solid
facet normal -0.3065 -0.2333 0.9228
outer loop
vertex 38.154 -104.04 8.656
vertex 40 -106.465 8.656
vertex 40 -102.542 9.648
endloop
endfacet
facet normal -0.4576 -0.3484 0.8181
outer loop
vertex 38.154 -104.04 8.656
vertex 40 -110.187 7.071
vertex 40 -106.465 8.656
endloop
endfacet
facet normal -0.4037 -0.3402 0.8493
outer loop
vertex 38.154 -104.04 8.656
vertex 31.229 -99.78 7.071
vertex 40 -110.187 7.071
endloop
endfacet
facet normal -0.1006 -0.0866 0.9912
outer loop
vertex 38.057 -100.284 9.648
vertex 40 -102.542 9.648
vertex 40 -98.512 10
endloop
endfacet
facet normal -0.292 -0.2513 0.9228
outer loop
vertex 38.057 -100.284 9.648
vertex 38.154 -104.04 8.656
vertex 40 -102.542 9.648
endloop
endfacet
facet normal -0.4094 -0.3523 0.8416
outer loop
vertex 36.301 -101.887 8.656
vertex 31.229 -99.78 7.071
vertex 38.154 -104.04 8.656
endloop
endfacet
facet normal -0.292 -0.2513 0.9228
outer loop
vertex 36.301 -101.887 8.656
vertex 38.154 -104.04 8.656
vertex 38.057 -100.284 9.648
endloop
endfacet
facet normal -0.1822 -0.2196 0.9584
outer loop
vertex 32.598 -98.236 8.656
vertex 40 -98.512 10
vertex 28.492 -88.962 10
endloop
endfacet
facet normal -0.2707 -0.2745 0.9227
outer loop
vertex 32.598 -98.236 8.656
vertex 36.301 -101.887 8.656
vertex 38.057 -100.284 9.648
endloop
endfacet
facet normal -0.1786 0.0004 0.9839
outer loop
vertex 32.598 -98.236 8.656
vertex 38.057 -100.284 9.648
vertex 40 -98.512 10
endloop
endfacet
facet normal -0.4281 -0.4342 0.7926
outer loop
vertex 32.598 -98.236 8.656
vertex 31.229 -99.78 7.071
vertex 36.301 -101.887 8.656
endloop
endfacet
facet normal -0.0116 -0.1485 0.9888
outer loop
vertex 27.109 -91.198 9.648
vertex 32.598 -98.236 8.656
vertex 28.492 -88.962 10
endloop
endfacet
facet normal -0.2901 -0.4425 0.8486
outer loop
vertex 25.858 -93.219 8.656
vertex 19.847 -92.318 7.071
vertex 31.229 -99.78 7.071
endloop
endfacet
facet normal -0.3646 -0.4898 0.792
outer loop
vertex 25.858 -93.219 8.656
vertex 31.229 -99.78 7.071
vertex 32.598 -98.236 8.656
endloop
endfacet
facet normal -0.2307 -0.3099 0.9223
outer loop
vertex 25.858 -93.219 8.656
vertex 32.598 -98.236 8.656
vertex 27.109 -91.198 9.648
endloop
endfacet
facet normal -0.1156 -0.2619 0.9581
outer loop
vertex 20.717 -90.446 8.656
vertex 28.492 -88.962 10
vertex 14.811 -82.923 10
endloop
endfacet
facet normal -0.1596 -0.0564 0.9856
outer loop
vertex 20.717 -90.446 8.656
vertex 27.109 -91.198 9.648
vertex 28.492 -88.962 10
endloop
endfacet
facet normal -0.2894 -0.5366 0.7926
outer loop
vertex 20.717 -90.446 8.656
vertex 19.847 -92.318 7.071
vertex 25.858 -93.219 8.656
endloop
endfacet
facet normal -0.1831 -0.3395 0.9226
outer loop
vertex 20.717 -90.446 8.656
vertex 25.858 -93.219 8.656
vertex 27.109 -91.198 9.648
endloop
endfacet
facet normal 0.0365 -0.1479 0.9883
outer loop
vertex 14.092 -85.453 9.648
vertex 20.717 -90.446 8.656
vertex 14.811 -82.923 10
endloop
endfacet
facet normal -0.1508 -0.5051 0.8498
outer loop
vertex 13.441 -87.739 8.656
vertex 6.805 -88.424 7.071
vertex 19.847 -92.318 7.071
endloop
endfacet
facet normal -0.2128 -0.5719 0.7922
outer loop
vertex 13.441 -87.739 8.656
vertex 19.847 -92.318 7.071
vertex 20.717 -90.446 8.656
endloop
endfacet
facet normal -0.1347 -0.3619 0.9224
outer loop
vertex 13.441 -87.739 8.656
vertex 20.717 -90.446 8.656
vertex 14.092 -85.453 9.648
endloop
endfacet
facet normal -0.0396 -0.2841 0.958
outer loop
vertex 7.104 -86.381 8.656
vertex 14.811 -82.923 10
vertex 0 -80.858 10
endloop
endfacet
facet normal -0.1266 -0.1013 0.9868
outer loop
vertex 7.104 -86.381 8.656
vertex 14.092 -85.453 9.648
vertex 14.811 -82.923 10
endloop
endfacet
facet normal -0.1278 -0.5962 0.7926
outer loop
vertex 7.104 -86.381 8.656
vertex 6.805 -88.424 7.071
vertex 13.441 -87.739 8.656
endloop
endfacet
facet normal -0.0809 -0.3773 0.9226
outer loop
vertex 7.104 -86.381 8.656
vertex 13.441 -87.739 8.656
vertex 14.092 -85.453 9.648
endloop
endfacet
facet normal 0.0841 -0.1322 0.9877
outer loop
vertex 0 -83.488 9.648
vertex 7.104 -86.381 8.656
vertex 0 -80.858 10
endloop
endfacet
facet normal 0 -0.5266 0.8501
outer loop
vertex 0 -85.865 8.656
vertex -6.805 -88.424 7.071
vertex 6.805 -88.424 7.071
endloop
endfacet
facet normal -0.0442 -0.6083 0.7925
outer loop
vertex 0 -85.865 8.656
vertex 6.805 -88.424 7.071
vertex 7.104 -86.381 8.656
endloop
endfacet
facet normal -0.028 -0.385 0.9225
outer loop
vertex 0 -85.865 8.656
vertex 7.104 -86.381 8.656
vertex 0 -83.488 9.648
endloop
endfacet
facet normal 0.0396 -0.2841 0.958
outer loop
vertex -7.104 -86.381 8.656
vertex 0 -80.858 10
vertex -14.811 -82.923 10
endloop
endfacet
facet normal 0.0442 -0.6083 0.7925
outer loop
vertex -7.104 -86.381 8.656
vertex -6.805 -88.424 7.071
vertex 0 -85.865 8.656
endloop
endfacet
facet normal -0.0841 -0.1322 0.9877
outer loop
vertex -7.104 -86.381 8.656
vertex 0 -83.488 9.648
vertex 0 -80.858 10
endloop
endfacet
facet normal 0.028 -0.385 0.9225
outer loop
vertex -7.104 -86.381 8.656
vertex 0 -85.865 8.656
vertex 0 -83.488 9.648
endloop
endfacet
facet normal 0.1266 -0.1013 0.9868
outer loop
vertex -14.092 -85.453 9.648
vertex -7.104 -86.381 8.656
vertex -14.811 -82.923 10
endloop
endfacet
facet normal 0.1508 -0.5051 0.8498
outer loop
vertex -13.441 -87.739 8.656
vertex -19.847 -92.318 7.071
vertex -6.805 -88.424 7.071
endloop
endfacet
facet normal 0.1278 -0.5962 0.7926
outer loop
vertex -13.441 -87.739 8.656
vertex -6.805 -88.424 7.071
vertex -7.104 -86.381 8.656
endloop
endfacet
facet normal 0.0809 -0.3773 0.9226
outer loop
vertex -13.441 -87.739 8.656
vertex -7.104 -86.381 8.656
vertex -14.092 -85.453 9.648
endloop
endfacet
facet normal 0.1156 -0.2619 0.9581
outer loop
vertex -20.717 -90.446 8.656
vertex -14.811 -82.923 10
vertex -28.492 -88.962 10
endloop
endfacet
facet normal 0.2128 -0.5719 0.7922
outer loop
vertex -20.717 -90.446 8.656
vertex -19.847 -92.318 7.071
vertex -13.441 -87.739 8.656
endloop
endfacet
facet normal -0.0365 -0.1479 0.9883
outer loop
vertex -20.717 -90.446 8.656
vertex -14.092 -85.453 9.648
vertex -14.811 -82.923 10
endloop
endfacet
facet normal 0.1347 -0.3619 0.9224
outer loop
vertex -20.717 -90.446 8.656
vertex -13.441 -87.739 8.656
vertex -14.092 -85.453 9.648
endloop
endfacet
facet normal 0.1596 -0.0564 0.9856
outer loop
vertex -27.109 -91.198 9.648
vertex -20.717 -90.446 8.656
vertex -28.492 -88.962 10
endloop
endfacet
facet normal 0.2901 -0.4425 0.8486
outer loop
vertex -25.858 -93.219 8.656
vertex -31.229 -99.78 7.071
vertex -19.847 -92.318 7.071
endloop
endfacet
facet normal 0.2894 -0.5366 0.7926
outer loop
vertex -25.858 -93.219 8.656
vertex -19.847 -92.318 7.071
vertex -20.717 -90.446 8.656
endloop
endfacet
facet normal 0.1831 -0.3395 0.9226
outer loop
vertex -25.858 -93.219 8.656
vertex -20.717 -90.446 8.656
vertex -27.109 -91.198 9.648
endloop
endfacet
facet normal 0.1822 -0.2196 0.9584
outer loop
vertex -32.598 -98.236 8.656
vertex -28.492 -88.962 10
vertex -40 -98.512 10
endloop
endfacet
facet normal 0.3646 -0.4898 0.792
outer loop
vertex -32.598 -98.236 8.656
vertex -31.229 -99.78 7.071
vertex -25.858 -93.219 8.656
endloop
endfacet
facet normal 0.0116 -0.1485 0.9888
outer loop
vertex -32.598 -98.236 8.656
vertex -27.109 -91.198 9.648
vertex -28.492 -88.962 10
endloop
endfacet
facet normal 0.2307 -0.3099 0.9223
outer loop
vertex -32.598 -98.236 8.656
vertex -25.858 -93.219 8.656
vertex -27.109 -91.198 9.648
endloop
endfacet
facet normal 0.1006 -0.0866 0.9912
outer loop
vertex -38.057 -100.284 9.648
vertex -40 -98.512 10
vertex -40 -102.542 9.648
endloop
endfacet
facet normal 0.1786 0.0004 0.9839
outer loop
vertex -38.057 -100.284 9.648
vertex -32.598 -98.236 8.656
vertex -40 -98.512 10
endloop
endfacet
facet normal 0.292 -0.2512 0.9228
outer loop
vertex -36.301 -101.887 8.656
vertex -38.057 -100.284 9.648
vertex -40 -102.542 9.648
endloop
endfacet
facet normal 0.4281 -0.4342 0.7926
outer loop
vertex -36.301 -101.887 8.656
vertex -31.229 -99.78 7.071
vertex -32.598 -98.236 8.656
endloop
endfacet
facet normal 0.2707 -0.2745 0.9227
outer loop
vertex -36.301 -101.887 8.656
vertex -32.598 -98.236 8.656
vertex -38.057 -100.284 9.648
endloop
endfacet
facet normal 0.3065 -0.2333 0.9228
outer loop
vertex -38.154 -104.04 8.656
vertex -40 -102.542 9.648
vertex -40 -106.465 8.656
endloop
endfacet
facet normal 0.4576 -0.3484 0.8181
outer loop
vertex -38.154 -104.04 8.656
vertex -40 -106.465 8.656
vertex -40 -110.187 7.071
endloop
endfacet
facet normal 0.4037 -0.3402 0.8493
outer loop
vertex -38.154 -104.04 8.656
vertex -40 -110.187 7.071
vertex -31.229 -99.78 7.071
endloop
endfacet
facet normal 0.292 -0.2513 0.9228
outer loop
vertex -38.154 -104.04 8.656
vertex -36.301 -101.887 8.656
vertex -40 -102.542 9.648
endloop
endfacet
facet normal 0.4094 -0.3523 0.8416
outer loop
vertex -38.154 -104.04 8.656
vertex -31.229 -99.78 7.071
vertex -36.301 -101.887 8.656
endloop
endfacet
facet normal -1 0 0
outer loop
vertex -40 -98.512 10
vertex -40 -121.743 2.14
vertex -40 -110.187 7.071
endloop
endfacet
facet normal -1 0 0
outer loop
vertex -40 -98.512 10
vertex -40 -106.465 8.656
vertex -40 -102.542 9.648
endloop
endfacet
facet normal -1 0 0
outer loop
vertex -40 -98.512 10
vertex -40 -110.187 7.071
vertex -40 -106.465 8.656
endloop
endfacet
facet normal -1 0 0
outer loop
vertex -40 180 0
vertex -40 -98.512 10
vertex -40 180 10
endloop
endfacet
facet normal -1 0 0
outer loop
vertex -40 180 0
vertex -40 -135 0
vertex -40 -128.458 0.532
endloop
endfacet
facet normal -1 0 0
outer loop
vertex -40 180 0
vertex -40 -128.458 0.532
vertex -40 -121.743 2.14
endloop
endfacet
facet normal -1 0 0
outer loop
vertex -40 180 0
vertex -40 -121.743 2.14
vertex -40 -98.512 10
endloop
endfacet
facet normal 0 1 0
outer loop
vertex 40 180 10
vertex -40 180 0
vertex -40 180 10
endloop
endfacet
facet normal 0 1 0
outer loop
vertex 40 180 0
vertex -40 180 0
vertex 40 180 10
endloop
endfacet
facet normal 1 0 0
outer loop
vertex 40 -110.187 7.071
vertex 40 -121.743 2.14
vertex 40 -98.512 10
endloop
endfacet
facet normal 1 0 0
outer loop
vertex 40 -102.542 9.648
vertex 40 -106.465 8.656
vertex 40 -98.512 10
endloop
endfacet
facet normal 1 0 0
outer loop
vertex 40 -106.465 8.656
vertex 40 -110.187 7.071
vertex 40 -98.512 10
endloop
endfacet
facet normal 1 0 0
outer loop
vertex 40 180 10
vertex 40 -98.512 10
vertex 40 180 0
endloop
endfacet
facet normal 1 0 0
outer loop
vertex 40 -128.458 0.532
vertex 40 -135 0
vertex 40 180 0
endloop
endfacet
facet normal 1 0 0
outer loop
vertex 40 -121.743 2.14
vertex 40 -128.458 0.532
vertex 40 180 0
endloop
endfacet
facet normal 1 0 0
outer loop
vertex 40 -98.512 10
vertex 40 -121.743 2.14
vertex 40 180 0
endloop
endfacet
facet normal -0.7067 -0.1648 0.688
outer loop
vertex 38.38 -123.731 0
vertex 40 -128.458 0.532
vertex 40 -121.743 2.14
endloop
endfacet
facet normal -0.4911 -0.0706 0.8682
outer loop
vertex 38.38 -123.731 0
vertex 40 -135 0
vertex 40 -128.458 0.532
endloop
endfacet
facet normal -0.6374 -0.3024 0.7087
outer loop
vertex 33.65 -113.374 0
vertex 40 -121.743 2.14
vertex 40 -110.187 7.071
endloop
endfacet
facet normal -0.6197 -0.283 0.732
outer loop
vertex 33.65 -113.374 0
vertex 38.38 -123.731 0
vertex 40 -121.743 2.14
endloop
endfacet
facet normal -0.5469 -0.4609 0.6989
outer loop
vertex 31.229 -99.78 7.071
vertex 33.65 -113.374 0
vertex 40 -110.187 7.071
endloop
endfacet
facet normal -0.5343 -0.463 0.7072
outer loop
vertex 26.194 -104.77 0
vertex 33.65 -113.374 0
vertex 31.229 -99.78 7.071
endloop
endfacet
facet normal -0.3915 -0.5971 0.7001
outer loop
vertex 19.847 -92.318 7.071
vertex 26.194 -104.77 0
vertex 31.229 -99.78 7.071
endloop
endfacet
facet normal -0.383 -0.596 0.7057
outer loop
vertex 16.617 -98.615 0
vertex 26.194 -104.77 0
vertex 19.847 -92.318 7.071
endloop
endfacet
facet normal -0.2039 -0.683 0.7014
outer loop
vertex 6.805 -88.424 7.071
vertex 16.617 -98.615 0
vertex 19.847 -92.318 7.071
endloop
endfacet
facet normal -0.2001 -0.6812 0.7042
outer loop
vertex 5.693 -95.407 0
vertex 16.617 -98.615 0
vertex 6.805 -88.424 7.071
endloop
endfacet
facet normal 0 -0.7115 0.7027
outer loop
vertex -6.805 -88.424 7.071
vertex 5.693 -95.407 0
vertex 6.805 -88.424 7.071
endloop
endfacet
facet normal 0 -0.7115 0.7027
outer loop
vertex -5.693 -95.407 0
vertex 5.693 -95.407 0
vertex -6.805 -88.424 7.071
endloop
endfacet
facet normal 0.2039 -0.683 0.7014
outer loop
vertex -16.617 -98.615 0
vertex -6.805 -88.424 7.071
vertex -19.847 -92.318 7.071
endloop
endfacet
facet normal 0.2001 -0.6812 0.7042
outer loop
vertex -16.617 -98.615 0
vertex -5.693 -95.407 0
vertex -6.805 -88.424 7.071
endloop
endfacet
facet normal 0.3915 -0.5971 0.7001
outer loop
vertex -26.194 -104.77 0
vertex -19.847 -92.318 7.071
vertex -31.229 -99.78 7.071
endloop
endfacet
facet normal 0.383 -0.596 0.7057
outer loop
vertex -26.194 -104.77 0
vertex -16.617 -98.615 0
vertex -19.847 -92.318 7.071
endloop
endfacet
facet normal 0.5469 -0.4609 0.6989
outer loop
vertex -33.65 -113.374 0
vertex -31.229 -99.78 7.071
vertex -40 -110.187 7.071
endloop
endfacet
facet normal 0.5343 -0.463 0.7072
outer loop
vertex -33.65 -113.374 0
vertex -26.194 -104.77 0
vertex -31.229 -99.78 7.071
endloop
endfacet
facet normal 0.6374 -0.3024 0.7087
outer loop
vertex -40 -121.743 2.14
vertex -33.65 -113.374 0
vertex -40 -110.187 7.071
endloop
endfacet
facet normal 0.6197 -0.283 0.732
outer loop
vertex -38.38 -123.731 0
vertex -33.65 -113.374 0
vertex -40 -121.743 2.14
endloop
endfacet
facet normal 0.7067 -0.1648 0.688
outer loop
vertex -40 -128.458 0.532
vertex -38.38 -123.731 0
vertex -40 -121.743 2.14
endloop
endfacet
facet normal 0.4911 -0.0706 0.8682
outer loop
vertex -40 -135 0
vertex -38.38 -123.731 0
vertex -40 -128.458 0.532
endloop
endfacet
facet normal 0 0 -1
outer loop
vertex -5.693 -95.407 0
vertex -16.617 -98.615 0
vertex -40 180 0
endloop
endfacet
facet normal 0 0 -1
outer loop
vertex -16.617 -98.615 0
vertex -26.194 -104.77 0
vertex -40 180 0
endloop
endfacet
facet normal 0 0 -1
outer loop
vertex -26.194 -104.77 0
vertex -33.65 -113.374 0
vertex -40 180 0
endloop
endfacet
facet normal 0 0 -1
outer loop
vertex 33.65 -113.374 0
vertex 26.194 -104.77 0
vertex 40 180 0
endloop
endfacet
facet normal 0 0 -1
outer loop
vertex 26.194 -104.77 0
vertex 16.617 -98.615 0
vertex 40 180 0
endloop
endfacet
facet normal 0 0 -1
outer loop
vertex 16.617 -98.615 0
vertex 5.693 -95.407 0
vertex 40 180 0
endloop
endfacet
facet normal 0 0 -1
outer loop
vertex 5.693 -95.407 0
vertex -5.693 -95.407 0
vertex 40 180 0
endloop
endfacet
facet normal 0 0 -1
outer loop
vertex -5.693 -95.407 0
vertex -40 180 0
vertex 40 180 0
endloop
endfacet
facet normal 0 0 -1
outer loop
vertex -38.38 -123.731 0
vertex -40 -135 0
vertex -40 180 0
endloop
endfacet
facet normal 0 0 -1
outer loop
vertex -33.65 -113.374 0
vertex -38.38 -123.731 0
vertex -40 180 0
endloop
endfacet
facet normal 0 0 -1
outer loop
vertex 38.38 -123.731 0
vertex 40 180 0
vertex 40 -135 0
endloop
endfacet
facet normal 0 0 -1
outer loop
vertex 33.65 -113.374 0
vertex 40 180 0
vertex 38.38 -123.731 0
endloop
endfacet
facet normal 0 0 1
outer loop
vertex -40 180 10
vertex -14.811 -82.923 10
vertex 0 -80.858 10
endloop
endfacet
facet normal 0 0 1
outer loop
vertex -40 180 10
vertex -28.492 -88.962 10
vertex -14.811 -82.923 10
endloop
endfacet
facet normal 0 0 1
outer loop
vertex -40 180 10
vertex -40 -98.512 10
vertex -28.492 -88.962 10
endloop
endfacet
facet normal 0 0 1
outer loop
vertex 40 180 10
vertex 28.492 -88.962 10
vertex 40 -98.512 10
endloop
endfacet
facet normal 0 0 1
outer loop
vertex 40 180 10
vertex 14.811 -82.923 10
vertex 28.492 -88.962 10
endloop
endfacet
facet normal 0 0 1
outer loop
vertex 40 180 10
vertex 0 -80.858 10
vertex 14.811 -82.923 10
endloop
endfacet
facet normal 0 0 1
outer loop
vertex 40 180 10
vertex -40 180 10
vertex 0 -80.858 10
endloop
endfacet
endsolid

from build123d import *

# Parameters (mm, degrees)
SKETCH1_W           = 80
SKETCH1_H           = 360
BOSS_EXTRUDE1_DEPTH = 10
CUT_EXTRUDE1_DEPTH  = 10
CHAMFER2_SIZE       = 10
FILLET1_R           = 10


with BuildPart() as part:
    # Sketch1 → Boss-Extrude1 (new body)
    with BuildSketch(Plane.XY):
        Rectangle(SKETCH1_W, SKETCH1_H)
    extrude(amount=BOSS_EXTRUDE1_DEPTH)

    # Sketch2 → Cut-Extrude1 (cut)
    with BuildSketch(Plane.XY.offset(10)):
        with BuildLine():
            Line((-40, -135), (-40, -180))
            Line((-40, -180), (40, -180))
            Line((40, -180), (40, -135))
            ThreePointArc((40, -135), (0, -95), (-40, -135))
        make_face()
    extrude(amount=-CUT_EXTRUDE1_DEPTH, mode=Mode.SUBTRACT)

    # Chamfer2
    chamfer2_edges = [part.edges().sort_by_distance(p)[0] for p in [
        (0, -95, 10),
    ]]
    chamfer(chamfer2_edges, length=CHAMFER2_SIZE - 0.0001)  # a hair under: the kernel refuses the full size

    # Fillet1
    fillet1_edges = [part.edges().sort_by_distance(p)[0] for p in [
        (0, -85.0001, 10),
    ]]
    fillet(fillet1_edges, radius=FILLET1_R)


solid = part.part
